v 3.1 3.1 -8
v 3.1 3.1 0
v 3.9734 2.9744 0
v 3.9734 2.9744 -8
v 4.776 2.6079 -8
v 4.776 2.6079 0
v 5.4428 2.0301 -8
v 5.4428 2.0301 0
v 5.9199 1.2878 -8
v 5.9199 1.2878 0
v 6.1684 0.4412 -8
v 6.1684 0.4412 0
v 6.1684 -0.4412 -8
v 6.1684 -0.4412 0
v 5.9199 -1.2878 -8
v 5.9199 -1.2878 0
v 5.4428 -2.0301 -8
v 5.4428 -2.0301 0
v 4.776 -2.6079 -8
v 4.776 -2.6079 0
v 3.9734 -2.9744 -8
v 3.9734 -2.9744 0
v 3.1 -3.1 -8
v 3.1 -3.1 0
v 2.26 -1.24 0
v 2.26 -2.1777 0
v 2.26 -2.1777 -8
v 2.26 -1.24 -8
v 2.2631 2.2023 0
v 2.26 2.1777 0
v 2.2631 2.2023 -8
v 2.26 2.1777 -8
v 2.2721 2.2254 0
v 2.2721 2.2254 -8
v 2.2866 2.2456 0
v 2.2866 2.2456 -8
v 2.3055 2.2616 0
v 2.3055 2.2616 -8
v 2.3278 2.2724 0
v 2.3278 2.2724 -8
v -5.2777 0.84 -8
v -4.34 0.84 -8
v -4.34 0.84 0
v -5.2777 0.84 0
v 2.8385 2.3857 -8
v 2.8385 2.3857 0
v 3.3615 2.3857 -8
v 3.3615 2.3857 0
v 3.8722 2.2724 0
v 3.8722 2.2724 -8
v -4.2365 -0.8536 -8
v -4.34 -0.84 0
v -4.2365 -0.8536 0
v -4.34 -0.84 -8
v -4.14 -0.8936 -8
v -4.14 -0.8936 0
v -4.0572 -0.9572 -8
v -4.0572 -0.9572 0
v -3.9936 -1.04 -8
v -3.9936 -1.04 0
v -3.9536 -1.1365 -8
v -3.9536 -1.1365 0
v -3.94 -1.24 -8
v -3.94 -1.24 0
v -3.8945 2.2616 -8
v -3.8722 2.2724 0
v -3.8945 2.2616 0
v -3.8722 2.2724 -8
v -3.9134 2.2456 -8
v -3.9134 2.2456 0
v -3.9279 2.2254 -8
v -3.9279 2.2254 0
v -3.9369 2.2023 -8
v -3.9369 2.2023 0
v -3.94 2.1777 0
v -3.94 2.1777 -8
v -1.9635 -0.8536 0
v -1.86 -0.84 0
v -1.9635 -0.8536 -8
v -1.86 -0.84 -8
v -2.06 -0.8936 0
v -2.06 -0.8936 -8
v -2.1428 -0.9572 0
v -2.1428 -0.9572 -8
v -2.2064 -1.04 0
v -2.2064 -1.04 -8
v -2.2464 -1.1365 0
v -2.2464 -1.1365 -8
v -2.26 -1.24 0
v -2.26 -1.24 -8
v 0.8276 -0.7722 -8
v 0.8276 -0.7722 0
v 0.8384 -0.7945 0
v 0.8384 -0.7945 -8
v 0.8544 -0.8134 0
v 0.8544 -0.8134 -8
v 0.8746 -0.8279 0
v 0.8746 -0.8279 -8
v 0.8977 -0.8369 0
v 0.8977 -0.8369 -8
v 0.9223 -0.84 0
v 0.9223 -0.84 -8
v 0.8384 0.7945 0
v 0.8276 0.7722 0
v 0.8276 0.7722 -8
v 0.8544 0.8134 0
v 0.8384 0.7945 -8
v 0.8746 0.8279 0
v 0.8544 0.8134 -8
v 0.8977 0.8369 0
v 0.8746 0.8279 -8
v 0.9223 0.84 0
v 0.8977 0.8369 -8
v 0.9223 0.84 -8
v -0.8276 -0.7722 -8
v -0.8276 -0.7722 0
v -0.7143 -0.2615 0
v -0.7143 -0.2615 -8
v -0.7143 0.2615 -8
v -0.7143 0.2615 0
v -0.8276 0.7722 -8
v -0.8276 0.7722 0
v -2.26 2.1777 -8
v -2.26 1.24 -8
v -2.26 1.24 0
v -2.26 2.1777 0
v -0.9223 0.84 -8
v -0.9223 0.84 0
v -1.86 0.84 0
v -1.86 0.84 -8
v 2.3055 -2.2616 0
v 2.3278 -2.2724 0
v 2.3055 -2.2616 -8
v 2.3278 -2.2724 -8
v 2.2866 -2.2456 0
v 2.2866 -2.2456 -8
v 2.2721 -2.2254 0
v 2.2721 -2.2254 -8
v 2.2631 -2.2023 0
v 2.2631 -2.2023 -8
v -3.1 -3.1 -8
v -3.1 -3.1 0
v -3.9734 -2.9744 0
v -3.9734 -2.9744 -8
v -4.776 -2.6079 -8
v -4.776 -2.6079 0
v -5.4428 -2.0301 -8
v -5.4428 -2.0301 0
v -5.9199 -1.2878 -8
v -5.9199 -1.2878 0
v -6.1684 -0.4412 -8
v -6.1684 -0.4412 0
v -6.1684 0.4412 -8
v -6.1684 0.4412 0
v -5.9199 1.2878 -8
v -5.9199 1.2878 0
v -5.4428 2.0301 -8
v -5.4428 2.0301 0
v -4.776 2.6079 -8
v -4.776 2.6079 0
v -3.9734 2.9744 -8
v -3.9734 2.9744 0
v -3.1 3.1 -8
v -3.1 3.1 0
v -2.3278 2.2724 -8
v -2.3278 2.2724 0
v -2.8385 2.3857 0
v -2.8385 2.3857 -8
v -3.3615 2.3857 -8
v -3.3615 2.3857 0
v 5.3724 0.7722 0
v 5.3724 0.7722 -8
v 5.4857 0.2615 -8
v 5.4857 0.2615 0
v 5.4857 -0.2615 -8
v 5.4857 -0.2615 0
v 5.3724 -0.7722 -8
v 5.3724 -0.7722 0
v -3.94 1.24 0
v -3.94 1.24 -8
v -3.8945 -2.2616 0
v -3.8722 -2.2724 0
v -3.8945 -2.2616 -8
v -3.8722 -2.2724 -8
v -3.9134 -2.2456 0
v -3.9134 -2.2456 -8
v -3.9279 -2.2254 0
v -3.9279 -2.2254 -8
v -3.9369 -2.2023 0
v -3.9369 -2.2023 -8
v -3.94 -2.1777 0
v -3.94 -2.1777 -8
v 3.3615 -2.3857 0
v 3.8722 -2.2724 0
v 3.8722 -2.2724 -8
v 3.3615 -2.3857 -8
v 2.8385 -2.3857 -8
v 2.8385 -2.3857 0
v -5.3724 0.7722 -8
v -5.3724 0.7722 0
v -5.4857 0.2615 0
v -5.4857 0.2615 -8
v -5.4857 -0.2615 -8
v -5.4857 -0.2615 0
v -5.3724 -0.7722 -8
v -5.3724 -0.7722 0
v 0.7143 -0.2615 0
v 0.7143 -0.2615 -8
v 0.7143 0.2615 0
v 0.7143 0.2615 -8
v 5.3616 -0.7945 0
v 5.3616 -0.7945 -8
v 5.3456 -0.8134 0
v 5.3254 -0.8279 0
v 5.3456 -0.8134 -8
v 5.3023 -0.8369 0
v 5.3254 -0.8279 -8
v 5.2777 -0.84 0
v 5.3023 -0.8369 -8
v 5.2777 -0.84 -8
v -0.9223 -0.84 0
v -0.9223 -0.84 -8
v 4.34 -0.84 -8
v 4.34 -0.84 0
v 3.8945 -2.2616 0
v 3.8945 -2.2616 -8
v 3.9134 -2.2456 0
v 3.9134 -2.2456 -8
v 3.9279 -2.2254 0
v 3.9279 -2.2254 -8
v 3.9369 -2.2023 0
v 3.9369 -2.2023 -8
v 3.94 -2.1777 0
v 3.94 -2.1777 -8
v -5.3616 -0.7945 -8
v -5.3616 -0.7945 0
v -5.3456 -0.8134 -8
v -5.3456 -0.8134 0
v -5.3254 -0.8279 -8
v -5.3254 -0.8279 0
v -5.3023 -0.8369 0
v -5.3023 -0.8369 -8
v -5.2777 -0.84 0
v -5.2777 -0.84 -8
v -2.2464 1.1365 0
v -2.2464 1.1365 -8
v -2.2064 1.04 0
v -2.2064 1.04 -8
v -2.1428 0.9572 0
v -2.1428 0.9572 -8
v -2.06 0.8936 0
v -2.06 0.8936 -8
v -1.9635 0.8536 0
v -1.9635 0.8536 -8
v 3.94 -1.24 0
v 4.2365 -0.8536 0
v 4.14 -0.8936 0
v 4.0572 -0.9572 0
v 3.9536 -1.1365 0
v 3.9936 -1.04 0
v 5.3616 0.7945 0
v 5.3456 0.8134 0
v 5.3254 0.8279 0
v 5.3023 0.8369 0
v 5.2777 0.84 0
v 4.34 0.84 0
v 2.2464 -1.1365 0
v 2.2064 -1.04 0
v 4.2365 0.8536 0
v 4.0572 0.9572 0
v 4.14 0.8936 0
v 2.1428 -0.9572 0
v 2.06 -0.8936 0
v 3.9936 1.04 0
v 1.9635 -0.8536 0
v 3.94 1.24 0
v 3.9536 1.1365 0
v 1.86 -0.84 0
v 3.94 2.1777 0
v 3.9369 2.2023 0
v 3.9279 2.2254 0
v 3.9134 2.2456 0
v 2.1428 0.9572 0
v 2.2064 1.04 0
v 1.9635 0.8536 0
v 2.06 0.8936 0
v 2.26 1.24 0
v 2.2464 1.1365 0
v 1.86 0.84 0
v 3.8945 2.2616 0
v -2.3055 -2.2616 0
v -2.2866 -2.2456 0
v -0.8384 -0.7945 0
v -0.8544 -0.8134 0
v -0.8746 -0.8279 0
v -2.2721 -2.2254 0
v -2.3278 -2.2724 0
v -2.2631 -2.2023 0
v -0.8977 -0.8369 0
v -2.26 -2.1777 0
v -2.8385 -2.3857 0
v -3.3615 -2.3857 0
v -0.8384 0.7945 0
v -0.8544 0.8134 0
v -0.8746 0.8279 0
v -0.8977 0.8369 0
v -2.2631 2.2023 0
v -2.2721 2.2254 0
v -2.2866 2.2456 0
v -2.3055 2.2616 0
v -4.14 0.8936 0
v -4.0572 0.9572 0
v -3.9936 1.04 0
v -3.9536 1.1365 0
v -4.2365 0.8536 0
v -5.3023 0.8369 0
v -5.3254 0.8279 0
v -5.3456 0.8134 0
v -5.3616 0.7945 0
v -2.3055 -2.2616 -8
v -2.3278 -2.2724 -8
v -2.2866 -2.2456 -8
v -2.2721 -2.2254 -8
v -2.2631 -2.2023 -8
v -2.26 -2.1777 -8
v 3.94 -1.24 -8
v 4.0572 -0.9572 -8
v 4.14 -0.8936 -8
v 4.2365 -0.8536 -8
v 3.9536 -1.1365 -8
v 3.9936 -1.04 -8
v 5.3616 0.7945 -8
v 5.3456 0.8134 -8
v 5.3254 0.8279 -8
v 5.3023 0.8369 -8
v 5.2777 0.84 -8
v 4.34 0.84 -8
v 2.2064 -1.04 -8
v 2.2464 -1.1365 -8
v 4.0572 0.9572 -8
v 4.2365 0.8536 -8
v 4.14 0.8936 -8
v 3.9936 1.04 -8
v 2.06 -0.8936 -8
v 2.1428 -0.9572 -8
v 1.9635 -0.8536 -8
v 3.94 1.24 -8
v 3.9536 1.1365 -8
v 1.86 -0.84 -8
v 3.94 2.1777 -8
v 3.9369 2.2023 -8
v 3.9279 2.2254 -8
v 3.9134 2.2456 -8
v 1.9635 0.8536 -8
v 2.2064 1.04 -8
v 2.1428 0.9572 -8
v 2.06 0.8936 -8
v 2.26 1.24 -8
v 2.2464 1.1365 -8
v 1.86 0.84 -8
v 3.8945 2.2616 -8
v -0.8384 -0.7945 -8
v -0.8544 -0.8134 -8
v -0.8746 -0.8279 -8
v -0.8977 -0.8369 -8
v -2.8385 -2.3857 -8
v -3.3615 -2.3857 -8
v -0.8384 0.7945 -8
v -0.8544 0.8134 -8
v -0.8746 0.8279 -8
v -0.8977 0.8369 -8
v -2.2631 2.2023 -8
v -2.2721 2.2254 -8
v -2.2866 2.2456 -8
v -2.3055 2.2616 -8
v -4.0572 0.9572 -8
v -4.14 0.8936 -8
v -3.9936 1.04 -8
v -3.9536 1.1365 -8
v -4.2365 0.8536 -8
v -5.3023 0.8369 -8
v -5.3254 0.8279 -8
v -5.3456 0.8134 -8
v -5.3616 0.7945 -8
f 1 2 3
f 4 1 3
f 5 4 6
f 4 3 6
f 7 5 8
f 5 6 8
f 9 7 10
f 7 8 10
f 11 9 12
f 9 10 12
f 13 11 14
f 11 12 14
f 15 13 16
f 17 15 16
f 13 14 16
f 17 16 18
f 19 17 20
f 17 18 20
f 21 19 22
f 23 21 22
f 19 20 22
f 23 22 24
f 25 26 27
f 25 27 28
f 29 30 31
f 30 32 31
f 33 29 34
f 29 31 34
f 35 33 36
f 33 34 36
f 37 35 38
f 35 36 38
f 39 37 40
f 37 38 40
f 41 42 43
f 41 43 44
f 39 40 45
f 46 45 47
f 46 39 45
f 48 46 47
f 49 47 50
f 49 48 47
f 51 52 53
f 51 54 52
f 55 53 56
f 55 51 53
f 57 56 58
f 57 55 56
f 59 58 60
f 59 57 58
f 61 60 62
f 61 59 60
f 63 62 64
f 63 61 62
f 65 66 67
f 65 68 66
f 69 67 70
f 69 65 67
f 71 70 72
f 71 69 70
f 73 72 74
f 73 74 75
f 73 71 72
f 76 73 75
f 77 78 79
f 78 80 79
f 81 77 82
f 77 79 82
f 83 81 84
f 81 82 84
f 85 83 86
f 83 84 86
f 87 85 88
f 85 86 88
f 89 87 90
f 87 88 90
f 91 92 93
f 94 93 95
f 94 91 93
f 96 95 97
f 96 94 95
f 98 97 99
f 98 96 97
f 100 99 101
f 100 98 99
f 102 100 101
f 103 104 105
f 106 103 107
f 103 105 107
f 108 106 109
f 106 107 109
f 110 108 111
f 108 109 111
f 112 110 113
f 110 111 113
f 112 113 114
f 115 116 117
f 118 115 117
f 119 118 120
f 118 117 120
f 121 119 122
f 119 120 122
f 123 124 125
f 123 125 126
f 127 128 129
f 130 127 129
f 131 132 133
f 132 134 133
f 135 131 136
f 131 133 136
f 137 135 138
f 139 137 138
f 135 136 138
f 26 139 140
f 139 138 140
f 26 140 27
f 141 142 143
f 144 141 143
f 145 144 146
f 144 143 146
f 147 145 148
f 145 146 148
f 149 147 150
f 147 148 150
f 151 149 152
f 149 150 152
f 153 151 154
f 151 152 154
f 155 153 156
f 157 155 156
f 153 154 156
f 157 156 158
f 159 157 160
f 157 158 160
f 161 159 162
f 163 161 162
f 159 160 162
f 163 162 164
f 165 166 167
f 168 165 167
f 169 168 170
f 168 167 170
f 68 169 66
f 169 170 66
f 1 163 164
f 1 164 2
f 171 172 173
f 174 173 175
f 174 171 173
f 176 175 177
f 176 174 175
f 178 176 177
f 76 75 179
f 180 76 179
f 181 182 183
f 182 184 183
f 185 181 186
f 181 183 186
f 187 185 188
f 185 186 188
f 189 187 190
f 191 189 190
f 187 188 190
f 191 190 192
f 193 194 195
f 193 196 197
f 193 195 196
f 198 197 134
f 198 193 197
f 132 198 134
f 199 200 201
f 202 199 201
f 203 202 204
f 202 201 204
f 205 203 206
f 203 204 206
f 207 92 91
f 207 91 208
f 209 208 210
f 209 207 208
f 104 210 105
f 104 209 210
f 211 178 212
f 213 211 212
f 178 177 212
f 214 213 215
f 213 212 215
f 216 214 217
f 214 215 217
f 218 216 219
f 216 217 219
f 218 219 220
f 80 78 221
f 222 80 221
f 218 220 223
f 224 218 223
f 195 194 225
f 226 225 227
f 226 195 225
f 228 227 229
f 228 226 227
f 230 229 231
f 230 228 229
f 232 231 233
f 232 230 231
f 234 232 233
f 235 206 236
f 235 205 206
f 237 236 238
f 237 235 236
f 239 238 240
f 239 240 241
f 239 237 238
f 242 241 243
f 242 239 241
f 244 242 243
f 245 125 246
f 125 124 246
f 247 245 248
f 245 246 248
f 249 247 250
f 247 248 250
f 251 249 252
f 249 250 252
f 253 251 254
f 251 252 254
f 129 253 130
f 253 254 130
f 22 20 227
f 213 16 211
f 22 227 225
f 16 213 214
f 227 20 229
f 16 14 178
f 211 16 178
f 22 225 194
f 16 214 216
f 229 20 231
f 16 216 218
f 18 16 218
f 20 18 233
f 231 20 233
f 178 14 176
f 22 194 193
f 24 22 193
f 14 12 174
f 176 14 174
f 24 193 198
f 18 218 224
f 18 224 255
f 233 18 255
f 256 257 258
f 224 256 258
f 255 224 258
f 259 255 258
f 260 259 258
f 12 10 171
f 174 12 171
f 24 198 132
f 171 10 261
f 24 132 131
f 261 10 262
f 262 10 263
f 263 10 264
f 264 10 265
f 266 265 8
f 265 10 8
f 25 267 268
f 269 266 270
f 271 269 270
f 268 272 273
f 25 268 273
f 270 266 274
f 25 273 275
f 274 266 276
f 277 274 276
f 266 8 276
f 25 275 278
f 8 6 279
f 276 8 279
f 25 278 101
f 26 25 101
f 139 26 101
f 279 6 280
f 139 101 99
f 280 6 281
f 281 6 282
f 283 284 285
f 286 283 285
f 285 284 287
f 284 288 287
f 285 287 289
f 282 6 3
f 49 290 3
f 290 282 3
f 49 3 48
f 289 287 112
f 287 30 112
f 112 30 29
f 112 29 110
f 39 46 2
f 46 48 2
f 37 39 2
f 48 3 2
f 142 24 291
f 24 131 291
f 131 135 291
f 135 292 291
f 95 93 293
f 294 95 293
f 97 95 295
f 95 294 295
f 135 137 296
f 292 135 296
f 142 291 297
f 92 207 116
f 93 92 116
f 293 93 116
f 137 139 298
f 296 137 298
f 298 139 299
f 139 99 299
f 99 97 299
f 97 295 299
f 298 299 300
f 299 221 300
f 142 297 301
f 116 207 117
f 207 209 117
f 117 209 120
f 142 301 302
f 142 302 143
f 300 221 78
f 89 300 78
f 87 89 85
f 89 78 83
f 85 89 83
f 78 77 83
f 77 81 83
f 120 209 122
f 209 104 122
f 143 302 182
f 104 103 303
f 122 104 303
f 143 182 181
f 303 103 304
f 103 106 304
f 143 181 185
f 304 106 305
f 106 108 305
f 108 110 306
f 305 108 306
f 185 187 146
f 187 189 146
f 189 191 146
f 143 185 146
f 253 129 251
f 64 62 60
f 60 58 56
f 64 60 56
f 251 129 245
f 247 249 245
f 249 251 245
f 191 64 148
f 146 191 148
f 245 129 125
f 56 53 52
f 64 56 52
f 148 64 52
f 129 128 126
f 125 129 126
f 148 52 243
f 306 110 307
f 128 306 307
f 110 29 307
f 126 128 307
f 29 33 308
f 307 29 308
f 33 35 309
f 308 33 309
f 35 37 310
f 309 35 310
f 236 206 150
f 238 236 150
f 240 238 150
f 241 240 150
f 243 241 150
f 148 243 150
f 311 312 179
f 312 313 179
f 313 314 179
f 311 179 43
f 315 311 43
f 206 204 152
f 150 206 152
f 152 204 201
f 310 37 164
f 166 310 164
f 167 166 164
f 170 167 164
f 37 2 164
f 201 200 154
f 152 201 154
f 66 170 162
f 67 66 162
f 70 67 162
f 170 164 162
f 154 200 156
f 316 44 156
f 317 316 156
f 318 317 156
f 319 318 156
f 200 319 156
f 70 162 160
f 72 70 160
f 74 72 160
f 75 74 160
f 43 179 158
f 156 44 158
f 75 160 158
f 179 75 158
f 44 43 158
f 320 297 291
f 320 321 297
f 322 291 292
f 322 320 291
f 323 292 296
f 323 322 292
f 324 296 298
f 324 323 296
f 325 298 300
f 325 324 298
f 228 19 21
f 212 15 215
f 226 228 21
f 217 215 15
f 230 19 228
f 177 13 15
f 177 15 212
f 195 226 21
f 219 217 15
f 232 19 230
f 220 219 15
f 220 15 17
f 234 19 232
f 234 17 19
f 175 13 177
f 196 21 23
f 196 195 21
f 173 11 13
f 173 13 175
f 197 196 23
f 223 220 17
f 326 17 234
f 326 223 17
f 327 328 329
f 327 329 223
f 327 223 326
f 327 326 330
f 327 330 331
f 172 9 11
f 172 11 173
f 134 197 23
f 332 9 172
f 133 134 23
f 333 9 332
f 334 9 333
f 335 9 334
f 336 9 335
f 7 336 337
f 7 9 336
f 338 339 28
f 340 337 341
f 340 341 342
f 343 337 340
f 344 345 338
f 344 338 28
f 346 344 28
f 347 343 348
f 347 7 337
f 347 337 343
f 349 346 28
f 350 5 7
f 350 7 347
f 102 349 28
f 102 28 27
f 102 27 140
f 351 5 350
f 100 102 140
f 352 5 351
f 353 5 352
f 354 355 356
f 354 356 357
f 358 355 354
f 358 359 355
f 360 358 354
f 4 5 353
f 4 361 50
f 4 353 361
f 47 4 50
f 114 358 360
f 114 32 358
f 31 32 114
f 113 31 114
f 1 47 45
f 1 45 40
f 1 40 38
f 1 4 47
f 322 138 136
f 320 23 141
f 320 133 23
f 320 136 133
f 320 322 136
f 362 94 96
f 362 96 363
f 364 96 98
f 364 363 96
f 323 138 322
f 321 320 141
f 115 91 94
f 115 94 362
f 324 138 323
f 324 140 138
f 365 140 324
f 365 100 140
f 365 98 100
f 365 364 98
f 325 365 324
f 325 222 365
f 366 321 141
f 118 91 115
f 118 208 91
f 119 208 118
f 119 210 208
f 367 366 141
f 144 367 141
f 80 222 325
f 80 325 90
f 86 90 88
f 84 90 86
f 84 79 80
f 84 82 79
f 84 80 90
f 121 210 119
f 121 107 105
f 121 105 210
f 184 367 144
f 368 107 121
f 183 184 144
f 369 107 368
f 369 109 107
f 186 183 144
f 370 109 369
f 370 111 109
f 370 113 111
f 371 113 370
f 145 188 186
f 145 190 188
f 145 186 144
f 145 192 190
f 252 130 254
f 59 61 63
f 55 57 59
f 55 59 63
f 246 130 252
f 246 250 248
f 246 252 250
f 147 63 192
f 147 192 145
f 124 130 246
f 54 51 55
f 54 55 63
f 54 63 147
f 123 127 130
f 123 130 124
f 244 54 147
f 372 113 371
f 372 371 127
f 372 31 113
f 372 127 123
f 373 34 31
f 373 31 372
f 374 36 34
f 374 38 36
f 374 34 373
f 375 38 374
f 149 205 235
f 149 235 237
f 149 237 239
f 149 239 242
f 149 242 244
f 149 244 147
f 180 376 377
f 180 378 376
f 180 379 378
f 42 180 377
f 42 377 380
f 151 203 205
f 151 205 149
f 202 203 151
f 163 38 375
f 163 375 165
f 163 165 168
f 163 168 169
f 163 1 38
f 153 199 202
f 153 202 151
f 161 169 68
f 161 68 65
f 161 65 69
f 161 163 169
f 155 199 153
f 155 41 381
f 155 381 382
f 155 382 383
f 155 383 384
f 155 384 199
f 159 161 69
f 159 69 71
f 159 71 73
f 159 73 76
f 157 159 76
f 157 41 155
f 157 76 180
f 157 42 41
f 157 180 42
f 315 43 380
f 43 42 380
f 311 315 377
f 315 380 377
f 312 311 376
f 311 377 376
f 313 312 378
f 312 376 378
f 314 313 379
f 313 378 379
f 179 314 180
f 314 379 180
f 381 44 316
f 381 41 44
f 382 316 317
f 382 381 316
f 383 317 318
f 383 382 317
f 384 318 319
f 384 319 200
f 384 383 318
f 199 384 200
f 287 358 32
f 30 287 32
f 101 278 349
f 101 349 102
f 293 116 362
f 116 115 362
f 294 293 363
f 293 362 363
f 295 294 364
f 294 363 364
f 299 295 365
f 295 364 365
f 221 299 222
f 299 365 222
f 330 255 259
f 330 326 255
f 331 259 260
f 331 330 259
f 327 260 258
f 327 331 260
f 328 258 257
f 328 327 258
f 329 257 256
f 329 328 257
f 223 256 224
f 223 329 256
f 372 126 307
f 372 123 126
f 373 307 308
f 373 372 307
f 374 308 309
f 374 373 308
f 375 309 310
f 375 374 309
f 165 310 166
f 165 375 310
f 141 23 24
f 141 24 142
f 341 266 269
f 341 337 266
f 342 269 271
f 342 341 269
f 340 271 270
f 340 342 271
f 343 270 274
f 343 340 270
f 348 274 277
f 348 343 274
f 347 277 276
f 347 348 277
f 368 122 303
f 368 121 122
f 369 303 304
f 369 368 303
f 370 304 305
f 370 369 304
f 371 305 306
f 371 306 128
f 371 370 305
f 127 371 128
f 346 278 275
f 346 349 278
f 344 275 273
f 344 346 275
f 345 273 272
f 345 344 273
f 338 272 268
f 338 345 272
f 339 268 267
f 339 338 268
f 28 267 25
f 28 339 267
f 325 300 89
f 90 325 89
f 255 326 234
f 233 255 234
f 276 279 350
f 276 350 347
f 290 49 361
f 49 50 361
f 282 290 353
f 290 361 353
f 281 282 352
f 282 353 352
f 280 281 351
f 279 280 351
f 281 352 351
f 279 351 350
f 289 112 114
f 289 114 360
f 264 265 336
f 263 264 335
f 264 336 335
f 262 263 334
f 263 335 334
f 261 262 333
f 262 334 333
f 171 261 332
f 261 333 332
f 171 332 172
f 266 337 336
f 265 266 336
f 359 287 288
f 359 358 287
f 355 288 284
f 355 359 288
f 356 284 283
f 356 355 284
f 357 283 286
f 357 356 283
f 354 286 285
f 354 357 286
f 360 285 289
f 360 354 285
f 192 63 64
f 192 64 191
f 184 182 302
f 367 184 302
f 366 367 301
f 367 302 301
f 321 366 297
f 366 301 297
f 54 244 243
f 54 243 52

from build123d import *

# Parameters (mm, degrees)
BOSS_EXTRUDE1_DEPTH   = 8
CUT_EXTRUDE1_DEPTH    = 11.585367259
FILLET1_R             = 0.4
FILLET2_R             = 0.4
FILLET3_R             = 0.4
FILLET4_R             = 0.4
FILLET5_R             = 0.1
FILLET6_R             = 0.1
FILLET7_R             = 0.1
FILLET8_R             = 0.1
FILLET9_R             = 0.1
FILLET10_R            = 0.1
FILLET11_R            = 0.1
FILLET12_R            = 0.1
FILLET1_OF_MIRROR1_R  = 0.4
FILLET2_OF_MIRROR1_R  = 0.4
FILLET3_OF_MIRROR1_R  = 0.4
FILLET4_OF_MIRROR1_R  = 0.4
FILLET5_OF_MIRROR1_R  = 0.1
FILLET6_OF_MIRROR1_R  = 0.1
FILLET7_OF_MIRROR1_R  = 0.1
FILLET8_OF_MIRROR1_R  = 0.1
FILLET9_OF_MIRROR1_R  = 0.1
FILLET10_OF_MIRROR1_R = 0.1
FILLET11_OF_MIRROR1_R = 0.1
FILLET12_OF_MIRROR1_R = 0.1


with BuildPart() as part:
    # Sketch2 → Boss-Extrude1 (new body)
    with BuildSketch(Plane.XY):
        with BuildLine():
            Line((-3.1, 3.1), (3.1, 3.1))
            ThreePointArc((3.1, 3.1), (6.2, 0), (3.1, -3.1))
            Line((3.1, -3.1), (-3.1, -3.1))
            ThreePointArc((-3.1, -3.1), (-6.2, 0), (-3.1, 3.1))
        make_face()
    extrude(amount=-BOSS_EXTRUDE1_DEPTH)

    # Sketch4 → Cut-Extrude1 (cut, through all)
    with BuildSketch(Plane.XY):
        with BuildLine():
            Line((-3.94, -0.84), (-3.94, -2.248199279))
            ThreePointArc((-3.94, -2.248199279), (-3.1, -2.4), (-2.26, -2.248199279))
            Line((-2.26, -2.248199279), (-2.26, -0.84))
            Line((-2.26, -0.84), (-0.851800721, -0.84))
            ThreePointArc((-0.851800721, -0.84), (-0.7, 0), (-0.851800721, 0.84))
            Line((-0.851800721, 0.84), (-2.26, 0.84))
            Line((-2.26, 0.84), (-2.26, 2.248199279))
            ThreePointArc((-2.26, 2.248199279), (-3.1, 2.4), (-3.94, 2.248199279))
            Line((-3.94, 2.248199279), (-3.94, 0.84))
            Line((-3.94, 0.84), (-5.348199279, 0.84))
            ThreePointArc((-5.348199279, 0.84), (-5.5, 0), (-5.348199279, -0.84))
            Line((-5.348199279, -0.84), (-3.94, -0.84))
        make_face()
    cut_extrude1 = extrude(amount=-CUT_EXTRUDE1_DEPTH, mode=Mode.SUBTRACT)

    # Fillet1
    fillet1_edges = [part.edges().sort_by_distance(p)[0] for p in [
        (-3.94, -0.84, -4),
    ]]
    fillet(fillet1_edges, radius=FILLET1_R)

    # Fillet2
    fillet2_edges = [part.edges().sort_by_distance(p)[0] for p in [
        (-3.94, 0.84, -4),
    ]]
    fillet(fillet2_edges, radius=FILLET2_R)

    # Fillet3
    fillet3_edges = [part.edges().sort_by_distance(p)[0] for p in [
        (-2.26, 0.84, -4),
    ]]
    fillet(fillet3_edges, radius=FILLET3_R)

    # Fillet4
    fillet4_edges = [part.edges().sort_by_distance(p)[0] for p in [
        (-2.26, -0.84, -4),
    ]]
    fillet(fillet4_edges, radius=FILLET4_R)

    # Fillet5
    fillet5_edges = [part.edges().sort_by_distance(p)[0] for p in [
        (-3.94, -2.248199279, -4),
    ]]
    fillet(fillet5_edges, radius=FILLET5_R)

    # Fillet6
    fillet6_edges = [part.edges().sort_by_distance(p)[0] for p in [
        (-2.26, -2.248199279, -4),
    ]]
    fillet(fillet6_edges, radius=FILLET6_R)

    # Fillet7
    fillet7_edges = [part.edges().sort_by_distance(p)[0] for p in [
        (-0.851800721, 0.84, -4),
    ]]
    fillet(fillet7_edges, radius=FILLET7_R)

    # Fillet8
    fillet8_edges = [part.edges().sort_by_distance(p)[0] for p in [
        (-0.851800721, -0.84, -4),
    ]]
    fillet(fillet8_edges, radius=FILLET8_R)

    # Fillet9
    fillet9_edges = [part.edges().sort_by_distance(p)[0] for p in [
        (-2.26, 2.248199279, -4),
    ]]
    fillet(fillet9_edges, radius=FILLET9_R)

    # Fillet10
    fillet10_edges = [part.edges().sort_by_distance(p)[0] for p in [
        (-3.94, 2.248199279, -4),
    ]]
    fillet(fillet10_edges, radius=FILLET10_R)

    # Fillet11
    fillet11_edges = [part.edges().sort_by_distance(p)[0] for p in [
        (-5.348199279, 0.84, -4),
    ]]
    fillet(fillet11_edges, radius=FILLET11_R)

    # Fillet12
    fillet12_edges = [part.edges().sort_by_distance(p)[0] for p in [
        (-5.348199279, -0.84, -4),
    ]]
    fillet(fillet12_edges, radius=FILLET12_R)

    # Mirror1: Cut-Extrude1 across plane
    add(cut_extrude1.mirror(Plane(origin=(0, 0, 0), x_dir=(0, 0, 1), z_dir=(1, 0, 0))), mode=Mode.SUBTRACT)

    # Fillet1 of Mirror1
    fillet1_of_mirror1_edges = [part.edges().sort_by_distance(p)[0] for p in [
        (3.94, -0.84, -4),
    ]]
    fillet(fillet1_of_mirror1_edges, radius=FILLET1_OF_MIRROR1_R)

    # Fillet2 of Mirror1
    fillet2_of_mirror1_edges = [part.edges().sort_by_distance(p)[0] for p in [
        (3.94, 0.84, -4),
    ]]
    fillet(fillet2_of_mirror1_edges, radius=FILLET2_OF_MIRROR1_R)

    # Fillet3 of Mirror1
    fillet3_of_mirror1_edges = [part.edges().sort_by_distance(p)[0] for p in [
        (2.26, 0.84, -4),
    ]]
    fillet(fillet3_of_mirror1_edges, radius=FILLET3_OF_MIRROR1_R)

    # Fillet4 of Mirror1
    fillet4_of_mirror1_edges = [part.edges().sort_by_distance(p)[0] for p in [
        (2.26, -0.84, -4),
    ]]
    fillet(fillet4_of_mirror1_edges, radius=FILLET4_OF_MIRROR1_R)

    # Fillet5 of Mirror1
    fillet5_of_mirror1_edges = [part.edges().sort_by_distance(p)[0] for p in [
        (3.94, -2.248199279, -4),
    ]]
    fillet(fillet5_of_mirror1_edges, radius=FILLET5_OF_MIRROR1_R)

    # Fillet6 of Mirror1
    fillet6_of_mirror1_edges = [part.edges().sort_by_distance(p)[0] for p in [
        (2.26, -2.248199279, -4),
    ]]
    fillet(fillet6_of_mirror1_edges, radius=FILLET6_OF_MIRROR1_R)

    # Fillet7 of Mirror1
    fillet7_of_mirror1_edges = [part.edges().sort_by_distance(p)[0] for p in [
        (0.851800721, 0.84, -4),
    ]]
    fillet(fillet7_of_mirror1_edges, radius=FILLET7_OF_MIRROR1_R)

    # Fillet8 of Mirror1
    fillet8_of_mirror1_edges = [part.edges().sort_by_distance(p)[0] for p in [
        (0.851800721, -0.84, -4),
    ]]
    fillet(fillet8_of_mirror1_edges, radius=FILLET8_OF_MIRROR1_R)

    # Fillet9 of Mirror1
    fillet9_of_mirror1_edges = [part.edges().sort_by_distance(p)[0] for p in [
        (2.26, 2.248199279, -4),
    ]]
    fillet(fillet9_of_mirror1_edges, radius=FILLET9_OF_MIRROR1_R)

    # Fillet10 of Mirror1
    fillet10_of_mirror1_edges = [part.edges().sort_by_distance(p)[0] for p in [
        (3.94, 2.248199279, -4),
    ]]
    fillet(fillet10_of_mirror1_edges, radius=FILLET10_OF_MIRROR1_R)

    # Fillet11 of Mirror1
    fillet11_of_mirror1_edges = [part.edges().sort_by_distance(p)[0] for p in [
        (5.348199279, 0.84, -4),
    ]]
    fillet(fillet11_of_mirror1_edges, radius=FILLET11_OF_MIRROR1_R)

    # Fillet12 of Mirror1
    fillet12_of_mirror1_edges = [part.edges().sort_by_distance(p)[0] for p in [
        (5.348199279, -0.84, -4),
    ]]
    fillet(fillet12_of_mirror1_edges, radius=FILLET12_OF_MIRROR1_R)


solid = part.part
